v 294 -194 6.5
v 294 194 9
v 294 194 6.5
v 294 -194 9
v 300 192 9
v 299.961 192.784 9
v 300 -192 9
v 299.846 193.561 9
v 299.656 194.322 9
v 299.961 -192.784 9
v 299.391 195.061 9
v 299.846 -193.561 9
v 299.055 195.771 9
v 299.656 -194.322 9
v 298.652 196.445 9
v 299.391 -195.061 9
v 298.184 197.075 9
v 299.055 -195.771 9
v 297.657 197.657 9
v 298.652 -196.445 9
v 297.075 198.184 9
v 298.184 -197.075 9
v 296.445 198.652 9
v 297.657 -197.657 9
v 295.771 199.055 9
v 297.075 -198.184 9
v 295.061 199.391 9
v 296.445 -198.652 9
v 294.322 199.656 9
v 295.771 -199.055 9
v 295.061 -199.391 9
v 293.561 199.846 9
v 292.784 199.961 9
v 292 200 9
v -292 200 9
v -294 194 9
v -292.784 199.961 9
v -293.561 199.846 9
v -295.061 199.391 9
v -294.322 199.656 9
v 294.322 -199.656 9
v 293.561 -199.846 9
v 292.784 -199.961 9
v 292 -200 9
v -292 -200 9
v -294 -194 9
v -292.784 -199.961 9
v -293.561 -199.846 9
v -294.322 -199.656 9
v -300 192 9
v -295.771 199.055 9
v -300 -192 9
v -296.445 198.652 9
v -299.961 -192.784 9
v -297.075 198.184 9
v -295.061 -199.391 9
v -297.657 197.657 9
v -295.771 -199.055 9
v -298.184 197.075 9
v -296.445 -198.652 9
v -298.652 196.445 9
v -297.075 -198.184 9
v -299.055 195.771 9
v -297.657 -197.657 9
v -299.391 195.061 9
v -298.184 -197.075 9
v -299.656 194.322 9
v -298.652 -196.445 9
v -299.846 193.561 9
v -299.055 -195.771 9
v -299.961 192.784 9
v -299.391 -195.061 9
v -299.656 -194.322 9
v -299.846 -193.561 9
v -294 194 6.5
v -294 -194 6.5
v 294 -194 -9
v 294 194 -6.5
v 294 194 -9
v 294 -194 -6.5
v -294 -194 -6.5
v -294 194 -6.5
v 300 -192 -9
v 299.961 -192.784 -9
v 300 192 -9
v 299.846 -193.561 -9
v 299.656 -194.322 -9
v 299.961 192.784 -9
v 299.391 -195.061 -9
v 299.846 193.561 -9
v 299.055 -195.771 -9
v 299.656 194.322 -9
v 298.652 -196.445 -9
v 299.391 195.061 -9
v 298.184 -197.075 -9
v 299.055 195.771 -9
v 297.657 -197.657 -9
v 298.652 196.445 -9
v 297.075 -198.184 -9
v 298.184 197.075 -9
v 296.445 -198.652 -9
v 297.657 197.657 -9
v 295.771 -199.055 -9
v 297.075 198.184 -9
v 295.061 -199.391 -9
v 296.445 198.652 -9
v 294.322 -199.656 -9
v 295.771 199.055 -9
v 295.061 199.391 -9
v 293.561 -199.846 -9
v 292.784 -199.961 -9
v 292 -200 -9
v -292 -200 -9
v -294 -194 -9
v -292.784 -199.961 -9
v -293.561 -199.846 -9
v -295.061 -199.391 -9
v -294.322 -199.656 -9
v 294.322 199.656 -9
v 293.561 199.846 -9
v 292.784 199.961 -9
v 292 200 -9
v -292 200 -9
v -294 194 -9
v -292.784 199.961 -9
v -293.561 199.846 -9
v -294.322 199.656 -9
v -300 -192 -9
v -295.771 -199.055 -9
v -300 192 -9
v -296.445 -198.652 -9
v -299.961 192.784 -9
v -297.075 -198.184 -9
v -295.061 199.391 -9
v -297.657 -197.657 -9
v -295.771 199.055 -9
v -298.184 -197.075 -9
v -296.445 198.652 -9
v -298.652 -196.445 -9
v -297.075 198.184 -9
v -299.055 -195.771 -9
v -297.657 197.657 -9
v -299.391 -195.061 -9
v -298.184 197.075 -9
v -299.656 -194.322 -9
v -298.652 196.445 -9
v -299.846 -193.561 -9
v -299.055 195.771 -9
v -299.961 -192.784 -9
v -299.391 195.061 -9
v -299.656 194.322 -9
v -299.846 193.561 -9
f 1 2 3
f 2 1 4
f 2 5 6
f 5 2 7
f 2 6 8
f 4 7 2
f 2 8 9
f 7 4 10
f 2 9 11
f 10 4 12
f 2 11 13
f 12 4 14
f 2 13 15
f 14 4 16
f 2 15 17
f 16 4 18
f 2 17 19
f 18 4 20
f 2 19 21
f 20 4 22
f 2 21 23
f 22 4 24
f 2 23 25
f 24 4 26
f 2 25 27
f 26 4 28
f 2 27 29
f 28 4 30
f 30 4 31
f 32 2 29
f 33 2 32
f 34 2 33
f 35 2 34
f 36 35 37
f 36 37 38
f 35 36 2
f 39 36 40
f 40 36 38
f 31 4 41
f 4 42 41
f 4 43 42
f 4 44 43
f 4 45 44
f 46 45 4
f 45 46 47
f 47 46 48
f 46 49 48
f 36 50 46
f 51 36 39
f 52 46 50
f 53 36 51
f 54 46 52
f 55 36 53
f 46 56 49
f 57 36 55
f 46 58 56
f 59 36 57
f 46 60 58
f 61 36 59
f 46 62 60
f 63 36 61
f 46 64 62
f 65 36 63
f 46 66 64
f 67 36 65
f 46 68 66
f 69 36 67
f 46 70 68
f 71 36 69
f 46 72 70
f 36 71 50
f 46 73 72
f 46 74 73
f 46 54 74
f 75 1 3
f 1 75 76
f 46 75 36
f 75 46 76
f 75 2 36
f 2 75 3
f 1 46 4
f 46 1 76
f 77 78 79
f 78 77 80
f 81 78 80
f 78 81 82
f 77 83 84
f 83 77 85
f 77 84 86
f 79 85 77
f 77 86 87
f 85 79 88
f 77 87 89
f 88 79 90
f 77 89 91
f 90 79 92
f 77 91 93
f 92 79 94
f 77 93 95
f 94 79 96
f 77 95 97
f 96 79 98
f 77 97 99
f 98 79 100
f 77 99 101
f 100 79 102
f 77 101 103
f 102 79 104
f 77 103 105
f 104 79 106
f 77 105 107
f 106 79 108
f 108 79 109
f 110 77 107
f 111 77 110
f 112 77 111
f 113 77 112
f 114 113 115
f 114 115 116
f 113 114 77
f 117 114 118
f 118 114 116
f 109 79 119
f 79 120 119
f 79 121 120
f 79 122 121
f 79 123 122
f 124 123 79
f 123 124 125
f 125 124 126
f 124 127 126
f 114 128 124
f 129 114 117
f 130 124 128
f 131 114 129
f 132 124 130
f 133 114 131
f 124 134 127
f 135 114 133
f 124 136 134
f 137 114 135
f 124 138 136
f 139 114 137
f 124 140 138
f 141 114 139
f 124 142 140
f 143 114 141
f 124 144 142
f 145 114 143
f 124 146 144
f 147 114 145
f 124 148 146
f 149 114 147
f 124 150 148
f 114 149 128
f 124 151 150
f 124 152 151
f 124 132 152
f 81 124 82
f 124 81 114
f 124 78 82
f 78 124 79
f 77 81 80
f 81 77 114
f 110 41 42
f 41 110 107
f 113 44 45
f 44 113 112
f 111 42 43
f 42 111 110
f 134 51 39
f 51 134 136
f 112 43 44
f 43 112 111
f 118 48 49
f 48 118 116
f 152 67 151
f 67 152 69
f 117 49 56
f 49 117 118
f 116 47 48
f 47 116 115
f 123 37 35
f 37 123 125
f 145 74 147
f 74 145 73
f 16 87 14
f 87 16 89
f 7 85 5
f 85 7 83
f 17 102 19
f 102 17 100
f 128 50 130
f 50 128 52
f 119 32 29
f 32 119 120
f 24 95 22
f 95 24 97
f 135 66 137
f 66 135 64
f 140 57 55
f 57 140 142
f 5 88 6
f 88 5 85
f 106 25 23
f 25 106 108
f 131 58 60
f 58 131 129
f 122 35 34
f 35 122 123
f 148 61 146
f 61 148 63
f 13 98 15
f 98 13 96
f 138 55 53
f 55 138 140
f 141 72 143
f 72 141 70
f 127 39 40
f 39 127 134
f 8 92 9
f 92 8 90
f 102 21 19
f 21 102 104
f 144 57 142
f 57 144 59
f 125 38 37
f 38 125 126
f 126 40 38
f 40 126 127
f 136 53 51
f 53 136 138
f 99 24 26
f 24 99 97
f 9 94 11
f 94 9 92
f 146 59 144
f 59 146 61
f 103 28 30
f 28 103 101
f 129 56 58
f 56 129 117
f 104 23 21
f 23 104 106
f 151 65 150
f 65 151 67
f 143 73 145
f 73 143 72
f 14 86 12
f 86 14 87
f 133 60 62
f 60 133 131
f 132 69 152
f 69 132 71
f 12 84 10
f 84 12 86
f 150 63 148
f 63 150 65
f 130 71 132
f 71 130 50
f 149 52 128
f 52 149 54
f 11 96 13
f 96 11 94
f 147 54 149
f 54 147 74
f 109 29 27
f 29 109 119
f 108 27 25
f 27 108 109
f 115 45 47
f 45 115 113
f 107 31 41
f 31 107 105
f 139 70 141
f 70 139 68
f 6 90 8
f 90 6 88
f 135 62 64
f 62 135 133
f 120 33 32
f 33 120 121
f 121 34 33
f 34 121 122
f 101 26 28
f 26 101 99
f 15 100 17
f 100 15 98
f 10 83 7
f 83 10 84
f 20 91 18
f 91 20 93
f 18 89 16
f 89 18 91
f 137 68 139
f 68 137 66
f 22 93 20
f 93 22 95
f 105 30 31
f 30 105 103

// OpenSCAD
// Sheet MDF (single connected solid)

// Parameters
sheet_length = 600; //[300:1200:1]
sheet_width = 400;  //[200:800:1]
sheet_thickness = 18; //[9:36:1]

corner_radius = 8; //[2:20:1]

chamfer_size = 1.5; //[0.5:4:0.5]
chamfer_inset = 6;  //[2:20:1]

grain_depth = 0.3; //[0.1:1:0.1]
grain_pitch = 20;  //[8:60:1]
grain_groove_width = 1.2; //[0.6:3:0.1]
grain_margin = 12; //[5:30:1]

mark_diameter = 12; //[6:30:1]
mark_depth = 0.6;   //[0.2:2:0.1]
mark_offset_x = 30; //[10:120:1]
mark_offset_y = 30; //[10:120:1]

overlap = 1; //[0.5:2:0.5]
$fn = 64;

// Helpers
function clamp(v, lo, hi) = v < lo ? lo : (v > hi ? hi : v);

// MDF-like color (visual only; geometry unchanged)
mdf_col = [0.72, 0.62, 0.45];

// Base: rounded-rectangle prism (true rounded corners, no floating parts)
module rounded_sheet(L, W, T, R) {
  R2 = clamp(R, 0, min(L, W)/2);
  linear_extrude(height=T, center=true)
    offset(r=R2)
      square([L - 2*R2, W - 2*R2], center=true);
}

// Subtractive features (kept shallow so sheet remains one connected solid)
module edge_chamfer_recess() {
  // Top and bottom shallow recesses inset from edges
  recess_xy = [sheet_length - 2*chamfer_inset, sheet_width - 2*chamfer_inset];
  recess_z  = chamfer_size + overlap;

  translate([0, 0,  sheet_thickness/2 - recess_z/2])
    cube([recess_xy[0], recess_xy[1], recess_z], center=true);

  translate([0, 0, -sheet_thickness/2 + recess_z/2])
    cube([recess_xy[0], recess_xy[1], recess_z], center=true);
}

module surface_texture_grain() {
  // Grooves on top face only, within margins
  usable_w = sheet_width - 2*grain_margin;
  n = max(0, floor(usable_w / grain_pitch));

  groove_len = sheet_length - 2*grain_margin;
  groove_h   = grain_depth + overlap;

  for (i = [0 : n]) {
    y = -sheet_width/2 + grain_margin + i*grain_pitch;
    translate([0, y, sheet_thickness/2 - groove_h/2])
      cube([groove_len, grain_groove_width, groove_h], center=true);
  }
}

module marking() {
  // Small shallow circular pocket on top face
  pocket_h = mark_depth + overlap;
  translate([
      -sheet_length/2 + mark_offset_x,
      -sheet_width/2  + mark_offset_y,
      sheet_thickness/2 - pocket_h/2
    ])
    cylinder(r=mark_diameter/2, h=pocket_h, center=true);
}

module subtractive_features() {
  union() {
    edge_chamfer_recess();
    surface_texture_grain();
    marking();
  }
}

// Final Output
color(mdf_col)
difference() {
  rounded_sheet(sheet_length, sheet_width, sheet_thickness, corner_radius);
  subtractive_features();
}
